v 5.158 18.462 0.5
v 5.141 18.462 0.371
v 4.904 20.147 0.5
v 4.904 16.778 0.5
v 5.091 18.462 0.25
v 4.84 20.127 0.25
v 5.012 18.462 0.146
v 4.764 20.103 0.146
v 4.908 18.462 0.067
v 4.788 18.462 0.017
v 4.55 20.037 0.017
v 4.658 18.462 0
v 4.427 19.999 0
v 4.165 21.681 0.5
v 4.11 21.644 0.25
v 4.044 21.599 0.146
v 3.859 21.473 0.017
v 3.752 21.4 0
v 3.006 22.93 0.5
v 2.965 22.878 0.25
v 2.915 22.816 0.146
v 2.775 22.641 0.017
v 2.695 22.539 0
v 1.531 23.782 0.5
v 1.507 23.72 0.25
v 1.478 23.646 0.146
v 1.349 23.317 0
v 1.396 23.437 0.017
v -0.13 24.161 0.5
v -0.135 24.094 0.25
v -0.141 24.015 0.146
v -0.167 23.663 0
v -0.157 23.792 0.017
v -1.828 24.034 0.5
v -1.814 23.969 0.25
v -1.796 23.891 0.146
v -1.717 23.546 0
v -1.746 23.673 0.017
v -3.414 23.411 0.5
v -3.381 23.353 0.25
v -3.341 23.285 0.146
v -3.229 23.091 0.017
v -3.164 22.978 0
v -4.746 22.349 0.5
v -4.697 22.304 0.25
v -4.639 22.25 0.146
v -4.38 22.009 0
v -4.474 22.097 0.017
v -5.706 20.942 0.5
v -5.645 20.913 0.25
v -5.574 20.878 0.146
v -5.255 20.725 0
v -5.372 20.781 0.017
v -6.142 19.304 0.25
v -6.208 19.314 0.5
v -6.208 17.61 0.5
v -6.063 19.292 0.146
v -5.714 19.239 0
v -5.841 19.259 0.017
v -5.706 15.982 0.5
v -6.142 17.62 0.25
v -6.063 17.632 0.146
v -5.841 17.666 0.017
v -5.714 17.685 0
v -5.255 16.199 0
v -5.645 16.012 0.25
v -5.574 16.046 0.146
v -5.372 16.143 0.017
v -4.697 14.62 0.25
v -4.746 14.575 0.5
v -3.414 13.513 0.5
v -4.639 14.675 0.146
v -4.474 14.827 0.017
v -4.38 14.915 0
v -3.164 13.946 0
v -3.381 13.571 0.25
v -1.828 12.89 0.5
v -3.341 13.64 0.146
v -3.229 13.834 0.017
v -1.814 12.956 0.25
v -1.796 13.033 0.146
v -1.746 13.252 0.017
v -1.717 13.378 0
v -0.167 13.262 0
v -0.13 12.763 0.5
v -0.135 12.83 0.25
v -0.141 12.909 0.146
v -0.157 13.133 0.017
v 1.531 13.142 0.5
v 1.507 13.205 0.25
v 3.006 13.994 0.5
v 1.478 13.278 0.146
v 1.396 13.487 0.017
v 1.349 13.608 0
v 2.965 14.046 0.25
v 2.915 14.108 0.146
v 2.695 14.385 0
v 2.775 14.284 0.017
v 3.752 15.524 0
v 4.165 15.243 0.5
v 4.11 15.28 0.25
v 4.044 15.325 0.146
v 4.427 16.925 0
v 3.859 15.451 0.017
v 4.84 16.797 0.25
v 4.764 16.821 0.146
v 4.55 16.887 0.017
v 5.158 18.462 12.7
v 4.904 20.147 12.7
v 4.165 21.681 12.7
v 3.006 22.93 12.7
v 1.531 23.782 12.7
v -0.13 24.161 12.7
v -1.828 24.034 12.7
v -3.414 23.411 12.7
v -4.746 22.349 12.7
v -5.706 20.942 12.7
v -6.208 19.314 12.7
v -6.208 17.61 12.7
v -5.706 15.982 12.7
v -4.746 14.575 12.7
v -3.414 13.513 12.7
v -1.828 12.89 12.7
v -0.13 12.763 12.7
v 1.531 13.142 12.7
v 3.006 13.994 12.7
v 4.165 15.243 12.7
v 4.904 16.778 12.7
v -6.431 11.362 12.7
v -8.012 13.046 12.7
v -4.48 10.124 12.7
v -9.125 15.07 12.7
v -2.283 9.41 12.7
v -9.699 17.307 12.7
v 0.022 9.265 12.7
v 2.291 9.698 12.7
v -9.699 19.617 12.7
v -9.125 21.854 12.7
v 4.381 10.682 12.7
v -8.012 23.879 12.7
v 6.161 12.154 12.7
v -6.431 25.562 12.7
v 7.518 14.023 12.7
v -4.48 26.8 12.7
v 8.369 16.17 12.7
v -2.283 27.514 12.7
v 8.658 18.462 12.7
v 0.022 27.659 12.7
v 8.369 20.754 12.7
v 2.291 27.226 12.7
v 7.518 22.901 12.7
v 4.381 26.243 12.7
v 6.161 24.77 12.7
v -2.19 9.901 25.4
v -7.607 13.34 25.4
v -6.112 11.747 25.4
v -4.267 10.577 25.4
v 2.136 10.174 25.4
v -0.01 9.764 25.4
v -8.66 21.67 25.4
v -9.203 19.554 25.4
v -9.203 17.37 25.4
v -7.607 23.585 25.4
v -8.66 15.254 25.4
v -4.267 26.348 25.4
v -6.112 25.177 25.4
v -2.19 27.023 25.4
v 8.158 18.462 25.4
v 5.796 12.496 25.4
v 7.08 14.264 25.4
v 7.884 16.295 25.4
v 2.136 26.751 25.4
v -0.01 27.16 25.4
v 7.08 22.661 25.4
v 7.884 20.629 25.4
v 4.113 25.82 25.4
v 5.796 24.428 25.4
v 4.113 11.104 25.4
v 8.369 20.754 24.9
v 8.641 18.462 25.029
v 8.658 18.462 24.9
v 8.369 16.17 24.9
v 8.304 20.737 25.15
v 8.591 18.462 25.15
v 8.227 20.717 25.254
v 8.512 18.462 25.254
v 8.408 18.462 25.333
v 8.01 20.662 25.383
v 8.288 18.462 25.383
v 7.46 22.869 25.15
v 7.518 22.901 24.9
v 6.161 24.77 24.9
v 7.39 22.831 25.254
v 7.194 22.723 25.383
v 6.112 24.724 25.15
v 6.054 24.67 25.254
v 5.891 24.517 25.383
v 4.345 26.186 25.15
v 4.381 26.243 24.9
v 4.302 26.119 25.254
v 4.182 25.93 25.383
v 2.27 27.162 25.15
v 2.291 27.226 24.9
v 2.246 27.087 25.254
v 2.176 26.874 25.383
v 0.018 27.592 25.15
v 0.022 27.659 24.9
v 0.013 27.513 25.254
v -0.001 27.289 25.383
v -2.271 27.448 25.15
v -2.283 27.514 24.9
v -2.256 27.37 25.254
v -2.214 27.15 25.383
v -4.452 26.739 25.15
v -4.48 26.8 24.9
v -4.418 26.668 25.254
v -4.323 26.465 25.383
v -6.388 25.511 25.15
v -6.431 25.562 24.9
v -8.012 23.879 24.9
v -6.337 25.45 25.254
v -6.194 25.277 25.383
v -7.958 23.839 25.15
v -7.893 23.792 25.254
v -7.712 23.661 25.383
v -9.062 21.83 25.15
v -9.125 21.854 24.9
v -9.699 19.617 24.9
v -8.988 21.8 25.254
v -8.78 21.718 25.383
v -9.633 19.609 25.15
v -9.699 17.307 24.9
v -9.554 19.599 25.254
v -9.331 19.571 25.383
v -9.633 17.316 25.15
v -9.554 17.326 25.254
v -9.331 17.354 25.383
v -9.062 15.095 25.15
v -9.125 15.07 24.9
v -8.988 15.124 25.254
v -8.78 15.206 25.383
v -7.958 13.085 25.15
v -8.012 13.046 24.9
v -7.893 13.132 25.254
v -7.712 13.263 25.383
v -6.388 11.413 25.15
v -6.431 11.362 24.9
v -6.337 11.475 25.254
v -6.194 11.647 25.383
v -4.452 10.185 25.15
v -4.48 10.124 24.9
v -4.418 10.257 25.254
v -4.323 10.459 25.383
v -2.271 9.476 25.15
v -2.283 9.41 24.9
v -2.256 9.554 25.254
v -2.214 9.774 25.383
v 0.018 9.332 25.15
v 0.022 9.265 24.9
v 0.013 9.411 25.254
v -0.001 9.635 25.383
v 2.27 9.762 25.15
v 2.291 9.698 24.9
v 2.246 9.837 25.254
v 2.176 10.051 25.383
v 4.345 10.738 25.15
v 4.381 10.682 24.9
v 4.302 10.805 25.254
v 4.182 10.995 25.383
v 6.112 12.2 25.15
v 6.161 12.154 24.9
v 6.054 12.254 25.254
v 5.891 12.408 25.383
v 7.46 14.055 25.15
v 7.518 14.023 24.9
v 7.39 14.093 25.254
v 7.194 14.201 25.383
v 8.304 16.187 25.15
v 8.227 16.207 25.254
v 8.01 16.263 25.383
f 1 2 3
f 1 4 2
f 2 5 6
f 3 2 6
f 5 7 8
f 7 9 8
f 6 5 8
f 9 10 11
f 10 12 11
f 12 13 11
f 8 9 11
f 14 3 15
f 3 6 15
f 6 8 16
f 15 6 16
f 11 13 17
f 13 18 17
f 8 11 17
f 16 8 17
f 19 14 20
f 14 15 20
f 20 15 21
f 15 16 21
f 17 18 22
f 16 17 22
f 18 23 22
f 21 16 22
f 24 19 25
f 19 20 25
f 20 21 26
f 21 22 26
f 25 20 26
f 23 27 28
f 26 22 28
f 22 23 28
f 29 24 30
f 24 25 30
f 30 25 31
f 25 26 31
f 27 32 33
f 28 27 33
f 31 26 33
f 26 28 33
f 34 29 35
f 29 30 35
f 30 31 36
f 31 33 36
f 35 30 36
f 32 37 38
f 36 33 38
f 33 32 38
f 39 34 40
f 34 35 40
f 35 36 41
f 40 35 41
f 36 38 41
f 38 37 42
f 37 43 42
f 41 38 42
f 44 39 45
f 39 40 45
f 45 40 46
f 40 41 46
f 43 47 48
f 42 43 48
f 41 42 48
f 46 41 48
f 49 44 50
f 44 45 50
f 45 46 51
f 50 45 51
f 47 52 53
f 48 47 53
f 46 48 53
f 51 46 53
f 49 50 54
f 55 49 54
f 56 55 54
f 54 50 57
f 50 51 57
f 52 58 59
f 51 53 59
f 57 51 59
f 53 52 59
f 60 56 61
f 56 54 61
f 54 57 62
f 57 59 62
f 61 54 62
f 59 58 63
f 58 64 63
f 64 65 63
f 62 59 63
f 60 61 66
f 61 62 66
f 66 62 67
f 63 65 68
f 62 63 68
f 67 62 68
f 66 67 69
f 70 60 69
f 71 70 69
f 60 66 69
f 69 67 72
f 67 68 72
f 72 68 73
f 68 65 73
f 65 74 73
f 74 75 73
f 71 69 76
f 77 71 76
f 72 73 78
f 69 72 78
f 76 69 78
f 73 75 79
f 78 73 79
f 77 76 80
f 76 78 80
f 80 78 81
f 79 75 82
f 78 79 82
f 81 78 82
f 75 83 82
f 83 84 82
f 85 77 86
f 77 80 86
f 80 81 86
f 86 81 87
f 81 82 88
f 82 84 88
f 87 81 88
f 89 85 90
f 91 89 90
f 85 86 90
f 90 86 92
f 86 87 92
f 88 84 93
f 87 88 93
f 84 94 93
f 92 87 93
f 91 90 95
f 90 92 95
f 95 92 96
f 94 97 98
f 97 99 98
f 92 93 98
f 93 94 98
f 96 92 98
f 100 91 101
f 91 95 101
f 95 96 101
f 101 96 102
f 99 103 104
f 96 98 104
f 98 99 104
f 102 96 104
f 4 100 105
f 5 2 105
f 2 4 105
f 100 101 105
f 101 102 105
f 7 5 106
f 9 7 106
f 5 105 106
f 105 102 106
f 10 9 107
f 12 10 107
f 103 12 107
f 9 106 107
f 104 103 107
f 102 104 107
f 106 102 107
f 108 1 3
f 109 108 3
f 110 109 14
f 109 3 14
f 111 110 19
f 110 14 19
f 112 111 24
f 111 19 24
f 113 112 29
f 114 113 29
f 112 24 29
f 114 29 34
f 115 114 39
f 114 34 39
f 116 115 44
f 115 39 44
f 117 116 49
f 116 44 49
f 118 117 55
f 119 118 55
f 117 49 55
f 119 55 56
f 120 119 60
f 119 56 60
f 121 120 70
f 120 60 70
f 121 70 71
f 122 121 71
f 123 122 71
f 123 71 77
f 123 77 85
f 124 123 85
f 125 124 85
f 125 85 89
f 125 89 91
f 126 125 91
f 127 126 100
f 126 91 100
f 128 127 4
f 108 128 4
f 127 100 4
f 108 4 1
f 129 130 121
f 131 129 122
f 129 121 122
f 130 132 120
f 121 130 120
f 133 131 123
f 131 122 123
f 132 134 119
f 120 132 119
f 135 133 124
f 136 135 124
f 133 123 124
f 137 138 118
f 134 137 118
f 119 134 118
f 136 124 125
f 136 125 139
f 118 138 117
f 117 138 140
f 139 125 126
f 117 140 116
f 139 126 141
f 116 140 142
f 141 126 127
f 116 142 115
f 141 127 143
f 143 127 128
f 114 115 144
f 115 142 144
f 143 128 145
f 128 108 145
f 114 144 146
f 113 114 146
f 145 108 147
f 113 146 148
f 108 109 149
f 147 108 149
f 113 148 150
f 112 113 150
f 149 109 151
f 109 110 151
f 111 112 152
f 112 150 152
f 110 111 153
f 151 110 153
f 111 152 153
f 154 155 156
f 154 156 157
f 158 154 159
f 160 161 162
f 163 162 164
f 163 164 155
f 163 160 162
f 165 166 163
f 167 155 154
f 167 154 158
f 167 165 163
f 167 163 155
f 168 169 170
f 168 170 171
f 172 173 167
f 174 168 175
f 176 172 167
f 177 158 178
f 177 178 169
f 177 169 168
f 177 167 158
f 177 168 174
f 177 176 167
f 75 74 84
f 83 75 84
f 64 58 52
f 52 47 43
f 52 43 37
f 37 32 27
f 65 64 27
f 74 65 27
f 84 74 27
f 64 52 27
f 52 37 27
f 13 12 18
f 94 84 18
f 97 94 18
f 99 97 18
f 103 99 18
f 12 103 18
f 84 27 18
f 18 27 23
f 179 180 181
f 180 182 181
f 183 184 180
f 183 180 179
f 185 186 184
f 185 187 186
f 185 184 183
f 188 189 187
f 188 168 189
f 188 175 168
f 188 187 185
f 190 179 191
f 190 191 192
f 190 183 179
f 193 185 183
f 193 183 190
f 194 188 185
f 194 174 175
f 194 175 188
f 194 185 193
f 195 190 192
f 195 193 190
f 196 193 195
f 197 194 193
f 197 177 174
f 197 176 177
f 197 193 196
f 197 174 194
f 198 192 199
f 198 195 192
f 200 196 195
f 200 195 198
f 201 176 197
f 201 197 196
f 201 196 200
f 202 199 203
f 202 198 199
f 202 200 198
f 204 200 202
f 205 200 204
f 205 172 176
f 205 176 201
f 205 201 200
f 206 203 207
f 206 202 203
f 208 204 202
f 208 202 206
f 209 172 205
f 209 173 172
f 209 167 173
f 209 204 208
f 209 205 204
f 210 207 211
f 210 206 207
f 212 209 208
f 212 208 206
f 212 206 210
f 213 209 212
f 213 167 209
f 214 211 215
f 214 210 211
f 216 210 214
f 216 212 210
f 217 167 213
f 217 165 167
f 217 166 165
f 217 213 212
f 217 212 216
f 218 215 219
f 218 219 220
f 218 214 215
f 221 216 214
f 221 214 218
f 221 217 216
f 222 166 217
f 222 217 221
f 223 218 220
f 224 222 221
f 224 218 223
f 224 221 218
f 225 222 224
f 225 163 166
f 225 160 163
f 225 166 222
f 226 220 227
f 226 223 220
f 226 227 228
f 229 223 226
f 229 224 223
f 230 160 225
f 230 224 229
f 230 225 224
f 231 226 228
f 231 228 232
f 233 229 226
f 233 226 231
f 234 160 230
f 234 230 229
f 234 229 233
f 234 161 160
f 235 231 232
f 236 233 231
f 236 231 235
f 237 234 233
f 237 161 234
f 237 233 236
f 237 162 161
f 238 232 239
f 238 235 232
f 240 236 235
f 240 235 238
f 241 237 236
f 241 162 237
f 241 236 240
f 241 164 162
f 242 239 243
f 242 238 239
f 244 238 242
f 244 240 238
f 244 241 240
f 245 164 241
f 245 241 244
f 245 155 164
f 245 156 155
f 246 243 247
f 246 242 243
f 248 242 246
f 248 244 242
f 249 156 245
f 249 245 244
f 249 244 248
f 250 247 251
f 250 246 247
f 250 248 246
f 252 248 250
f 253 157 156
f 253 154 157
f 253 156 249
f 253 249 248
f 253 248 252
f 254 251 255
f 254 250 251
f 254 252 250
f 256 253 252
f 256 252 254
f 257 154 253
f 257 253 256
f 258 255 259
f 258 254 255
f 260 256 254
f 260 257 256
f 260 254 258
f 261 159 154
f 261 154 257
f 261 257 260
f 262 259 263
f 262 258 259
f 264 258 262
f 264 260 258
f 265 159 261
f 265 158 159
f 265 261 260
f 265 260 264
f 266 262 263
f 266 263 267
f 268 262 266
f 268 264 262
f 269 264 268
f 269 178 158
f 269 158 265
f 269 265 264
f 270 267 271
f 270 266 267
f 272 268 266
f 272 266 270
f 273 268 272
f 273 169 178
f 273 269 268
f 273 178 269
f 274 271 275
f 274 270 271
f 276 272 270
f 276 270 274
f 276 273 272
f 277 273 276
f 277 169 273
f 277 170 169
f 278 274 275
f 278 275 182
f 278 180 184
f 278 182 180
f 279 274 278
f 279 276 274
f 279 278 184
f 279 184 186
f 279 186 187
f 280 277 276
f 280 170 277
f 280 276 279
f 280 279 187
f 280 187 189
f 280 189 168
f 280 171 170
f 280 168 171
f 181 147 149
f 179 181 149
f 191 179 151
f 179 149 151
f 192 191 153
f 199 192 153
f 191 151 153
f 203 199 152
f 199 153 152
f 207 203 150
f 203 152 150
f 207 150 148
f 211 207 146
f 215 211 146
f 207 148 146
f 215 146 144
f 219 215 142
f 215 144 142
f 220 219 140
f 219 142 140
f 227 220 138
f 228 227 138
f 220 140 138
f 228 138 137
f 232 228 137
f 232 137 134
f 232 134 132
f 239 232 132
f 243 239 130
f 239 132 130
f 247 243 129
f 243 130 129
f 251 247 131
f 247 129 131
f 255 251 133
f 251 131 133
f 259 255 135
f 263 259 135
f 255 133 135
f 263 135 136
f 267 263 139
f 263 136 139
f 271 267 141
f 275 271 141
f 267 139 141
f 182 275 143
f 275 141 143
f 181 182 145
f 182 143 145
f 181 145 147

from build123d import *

# Parameters (mm, degrees)
F0_R     = 5.715
F1_DEPTH = 12.7
F3_R     = 9.215
F4_DEPTH = 12.7
F5_R     = 0.5
F6_R     = 0.5


with BuildPart() as f1:
    # F0 (on Top) → F1 (new body)
    with BuildSketch(Plane.XY):
        with Locations((-0.556749, 18.462112)):
            Circle(F0_R)
    extrude(amount=F1_DEPTH)

    # F3 (on offset) → F4 (join)
    with BuildSketch(Plane.XY.offset(12.7)):
        with Locations((-0.556749, 18.462112)):
            Circle(F3_R)
    extrude(amount=F4_DEPTH)

    # F5
    f5_edges = [f1.edges().sort_by_distance(p)[0] for p in [
        (-9.771749, 18.462112, 25.4),
    ]]
    fillet(f5_edges, radius=F5_R)

    # F6
    f6_edges = [f1.edges().sort_by_distance(p)[0] for p in [
        (-6.271749, 18.462112, 0),
    ]]
    fillet(f6_edges, radius=F6_R)


solid = f1.part
